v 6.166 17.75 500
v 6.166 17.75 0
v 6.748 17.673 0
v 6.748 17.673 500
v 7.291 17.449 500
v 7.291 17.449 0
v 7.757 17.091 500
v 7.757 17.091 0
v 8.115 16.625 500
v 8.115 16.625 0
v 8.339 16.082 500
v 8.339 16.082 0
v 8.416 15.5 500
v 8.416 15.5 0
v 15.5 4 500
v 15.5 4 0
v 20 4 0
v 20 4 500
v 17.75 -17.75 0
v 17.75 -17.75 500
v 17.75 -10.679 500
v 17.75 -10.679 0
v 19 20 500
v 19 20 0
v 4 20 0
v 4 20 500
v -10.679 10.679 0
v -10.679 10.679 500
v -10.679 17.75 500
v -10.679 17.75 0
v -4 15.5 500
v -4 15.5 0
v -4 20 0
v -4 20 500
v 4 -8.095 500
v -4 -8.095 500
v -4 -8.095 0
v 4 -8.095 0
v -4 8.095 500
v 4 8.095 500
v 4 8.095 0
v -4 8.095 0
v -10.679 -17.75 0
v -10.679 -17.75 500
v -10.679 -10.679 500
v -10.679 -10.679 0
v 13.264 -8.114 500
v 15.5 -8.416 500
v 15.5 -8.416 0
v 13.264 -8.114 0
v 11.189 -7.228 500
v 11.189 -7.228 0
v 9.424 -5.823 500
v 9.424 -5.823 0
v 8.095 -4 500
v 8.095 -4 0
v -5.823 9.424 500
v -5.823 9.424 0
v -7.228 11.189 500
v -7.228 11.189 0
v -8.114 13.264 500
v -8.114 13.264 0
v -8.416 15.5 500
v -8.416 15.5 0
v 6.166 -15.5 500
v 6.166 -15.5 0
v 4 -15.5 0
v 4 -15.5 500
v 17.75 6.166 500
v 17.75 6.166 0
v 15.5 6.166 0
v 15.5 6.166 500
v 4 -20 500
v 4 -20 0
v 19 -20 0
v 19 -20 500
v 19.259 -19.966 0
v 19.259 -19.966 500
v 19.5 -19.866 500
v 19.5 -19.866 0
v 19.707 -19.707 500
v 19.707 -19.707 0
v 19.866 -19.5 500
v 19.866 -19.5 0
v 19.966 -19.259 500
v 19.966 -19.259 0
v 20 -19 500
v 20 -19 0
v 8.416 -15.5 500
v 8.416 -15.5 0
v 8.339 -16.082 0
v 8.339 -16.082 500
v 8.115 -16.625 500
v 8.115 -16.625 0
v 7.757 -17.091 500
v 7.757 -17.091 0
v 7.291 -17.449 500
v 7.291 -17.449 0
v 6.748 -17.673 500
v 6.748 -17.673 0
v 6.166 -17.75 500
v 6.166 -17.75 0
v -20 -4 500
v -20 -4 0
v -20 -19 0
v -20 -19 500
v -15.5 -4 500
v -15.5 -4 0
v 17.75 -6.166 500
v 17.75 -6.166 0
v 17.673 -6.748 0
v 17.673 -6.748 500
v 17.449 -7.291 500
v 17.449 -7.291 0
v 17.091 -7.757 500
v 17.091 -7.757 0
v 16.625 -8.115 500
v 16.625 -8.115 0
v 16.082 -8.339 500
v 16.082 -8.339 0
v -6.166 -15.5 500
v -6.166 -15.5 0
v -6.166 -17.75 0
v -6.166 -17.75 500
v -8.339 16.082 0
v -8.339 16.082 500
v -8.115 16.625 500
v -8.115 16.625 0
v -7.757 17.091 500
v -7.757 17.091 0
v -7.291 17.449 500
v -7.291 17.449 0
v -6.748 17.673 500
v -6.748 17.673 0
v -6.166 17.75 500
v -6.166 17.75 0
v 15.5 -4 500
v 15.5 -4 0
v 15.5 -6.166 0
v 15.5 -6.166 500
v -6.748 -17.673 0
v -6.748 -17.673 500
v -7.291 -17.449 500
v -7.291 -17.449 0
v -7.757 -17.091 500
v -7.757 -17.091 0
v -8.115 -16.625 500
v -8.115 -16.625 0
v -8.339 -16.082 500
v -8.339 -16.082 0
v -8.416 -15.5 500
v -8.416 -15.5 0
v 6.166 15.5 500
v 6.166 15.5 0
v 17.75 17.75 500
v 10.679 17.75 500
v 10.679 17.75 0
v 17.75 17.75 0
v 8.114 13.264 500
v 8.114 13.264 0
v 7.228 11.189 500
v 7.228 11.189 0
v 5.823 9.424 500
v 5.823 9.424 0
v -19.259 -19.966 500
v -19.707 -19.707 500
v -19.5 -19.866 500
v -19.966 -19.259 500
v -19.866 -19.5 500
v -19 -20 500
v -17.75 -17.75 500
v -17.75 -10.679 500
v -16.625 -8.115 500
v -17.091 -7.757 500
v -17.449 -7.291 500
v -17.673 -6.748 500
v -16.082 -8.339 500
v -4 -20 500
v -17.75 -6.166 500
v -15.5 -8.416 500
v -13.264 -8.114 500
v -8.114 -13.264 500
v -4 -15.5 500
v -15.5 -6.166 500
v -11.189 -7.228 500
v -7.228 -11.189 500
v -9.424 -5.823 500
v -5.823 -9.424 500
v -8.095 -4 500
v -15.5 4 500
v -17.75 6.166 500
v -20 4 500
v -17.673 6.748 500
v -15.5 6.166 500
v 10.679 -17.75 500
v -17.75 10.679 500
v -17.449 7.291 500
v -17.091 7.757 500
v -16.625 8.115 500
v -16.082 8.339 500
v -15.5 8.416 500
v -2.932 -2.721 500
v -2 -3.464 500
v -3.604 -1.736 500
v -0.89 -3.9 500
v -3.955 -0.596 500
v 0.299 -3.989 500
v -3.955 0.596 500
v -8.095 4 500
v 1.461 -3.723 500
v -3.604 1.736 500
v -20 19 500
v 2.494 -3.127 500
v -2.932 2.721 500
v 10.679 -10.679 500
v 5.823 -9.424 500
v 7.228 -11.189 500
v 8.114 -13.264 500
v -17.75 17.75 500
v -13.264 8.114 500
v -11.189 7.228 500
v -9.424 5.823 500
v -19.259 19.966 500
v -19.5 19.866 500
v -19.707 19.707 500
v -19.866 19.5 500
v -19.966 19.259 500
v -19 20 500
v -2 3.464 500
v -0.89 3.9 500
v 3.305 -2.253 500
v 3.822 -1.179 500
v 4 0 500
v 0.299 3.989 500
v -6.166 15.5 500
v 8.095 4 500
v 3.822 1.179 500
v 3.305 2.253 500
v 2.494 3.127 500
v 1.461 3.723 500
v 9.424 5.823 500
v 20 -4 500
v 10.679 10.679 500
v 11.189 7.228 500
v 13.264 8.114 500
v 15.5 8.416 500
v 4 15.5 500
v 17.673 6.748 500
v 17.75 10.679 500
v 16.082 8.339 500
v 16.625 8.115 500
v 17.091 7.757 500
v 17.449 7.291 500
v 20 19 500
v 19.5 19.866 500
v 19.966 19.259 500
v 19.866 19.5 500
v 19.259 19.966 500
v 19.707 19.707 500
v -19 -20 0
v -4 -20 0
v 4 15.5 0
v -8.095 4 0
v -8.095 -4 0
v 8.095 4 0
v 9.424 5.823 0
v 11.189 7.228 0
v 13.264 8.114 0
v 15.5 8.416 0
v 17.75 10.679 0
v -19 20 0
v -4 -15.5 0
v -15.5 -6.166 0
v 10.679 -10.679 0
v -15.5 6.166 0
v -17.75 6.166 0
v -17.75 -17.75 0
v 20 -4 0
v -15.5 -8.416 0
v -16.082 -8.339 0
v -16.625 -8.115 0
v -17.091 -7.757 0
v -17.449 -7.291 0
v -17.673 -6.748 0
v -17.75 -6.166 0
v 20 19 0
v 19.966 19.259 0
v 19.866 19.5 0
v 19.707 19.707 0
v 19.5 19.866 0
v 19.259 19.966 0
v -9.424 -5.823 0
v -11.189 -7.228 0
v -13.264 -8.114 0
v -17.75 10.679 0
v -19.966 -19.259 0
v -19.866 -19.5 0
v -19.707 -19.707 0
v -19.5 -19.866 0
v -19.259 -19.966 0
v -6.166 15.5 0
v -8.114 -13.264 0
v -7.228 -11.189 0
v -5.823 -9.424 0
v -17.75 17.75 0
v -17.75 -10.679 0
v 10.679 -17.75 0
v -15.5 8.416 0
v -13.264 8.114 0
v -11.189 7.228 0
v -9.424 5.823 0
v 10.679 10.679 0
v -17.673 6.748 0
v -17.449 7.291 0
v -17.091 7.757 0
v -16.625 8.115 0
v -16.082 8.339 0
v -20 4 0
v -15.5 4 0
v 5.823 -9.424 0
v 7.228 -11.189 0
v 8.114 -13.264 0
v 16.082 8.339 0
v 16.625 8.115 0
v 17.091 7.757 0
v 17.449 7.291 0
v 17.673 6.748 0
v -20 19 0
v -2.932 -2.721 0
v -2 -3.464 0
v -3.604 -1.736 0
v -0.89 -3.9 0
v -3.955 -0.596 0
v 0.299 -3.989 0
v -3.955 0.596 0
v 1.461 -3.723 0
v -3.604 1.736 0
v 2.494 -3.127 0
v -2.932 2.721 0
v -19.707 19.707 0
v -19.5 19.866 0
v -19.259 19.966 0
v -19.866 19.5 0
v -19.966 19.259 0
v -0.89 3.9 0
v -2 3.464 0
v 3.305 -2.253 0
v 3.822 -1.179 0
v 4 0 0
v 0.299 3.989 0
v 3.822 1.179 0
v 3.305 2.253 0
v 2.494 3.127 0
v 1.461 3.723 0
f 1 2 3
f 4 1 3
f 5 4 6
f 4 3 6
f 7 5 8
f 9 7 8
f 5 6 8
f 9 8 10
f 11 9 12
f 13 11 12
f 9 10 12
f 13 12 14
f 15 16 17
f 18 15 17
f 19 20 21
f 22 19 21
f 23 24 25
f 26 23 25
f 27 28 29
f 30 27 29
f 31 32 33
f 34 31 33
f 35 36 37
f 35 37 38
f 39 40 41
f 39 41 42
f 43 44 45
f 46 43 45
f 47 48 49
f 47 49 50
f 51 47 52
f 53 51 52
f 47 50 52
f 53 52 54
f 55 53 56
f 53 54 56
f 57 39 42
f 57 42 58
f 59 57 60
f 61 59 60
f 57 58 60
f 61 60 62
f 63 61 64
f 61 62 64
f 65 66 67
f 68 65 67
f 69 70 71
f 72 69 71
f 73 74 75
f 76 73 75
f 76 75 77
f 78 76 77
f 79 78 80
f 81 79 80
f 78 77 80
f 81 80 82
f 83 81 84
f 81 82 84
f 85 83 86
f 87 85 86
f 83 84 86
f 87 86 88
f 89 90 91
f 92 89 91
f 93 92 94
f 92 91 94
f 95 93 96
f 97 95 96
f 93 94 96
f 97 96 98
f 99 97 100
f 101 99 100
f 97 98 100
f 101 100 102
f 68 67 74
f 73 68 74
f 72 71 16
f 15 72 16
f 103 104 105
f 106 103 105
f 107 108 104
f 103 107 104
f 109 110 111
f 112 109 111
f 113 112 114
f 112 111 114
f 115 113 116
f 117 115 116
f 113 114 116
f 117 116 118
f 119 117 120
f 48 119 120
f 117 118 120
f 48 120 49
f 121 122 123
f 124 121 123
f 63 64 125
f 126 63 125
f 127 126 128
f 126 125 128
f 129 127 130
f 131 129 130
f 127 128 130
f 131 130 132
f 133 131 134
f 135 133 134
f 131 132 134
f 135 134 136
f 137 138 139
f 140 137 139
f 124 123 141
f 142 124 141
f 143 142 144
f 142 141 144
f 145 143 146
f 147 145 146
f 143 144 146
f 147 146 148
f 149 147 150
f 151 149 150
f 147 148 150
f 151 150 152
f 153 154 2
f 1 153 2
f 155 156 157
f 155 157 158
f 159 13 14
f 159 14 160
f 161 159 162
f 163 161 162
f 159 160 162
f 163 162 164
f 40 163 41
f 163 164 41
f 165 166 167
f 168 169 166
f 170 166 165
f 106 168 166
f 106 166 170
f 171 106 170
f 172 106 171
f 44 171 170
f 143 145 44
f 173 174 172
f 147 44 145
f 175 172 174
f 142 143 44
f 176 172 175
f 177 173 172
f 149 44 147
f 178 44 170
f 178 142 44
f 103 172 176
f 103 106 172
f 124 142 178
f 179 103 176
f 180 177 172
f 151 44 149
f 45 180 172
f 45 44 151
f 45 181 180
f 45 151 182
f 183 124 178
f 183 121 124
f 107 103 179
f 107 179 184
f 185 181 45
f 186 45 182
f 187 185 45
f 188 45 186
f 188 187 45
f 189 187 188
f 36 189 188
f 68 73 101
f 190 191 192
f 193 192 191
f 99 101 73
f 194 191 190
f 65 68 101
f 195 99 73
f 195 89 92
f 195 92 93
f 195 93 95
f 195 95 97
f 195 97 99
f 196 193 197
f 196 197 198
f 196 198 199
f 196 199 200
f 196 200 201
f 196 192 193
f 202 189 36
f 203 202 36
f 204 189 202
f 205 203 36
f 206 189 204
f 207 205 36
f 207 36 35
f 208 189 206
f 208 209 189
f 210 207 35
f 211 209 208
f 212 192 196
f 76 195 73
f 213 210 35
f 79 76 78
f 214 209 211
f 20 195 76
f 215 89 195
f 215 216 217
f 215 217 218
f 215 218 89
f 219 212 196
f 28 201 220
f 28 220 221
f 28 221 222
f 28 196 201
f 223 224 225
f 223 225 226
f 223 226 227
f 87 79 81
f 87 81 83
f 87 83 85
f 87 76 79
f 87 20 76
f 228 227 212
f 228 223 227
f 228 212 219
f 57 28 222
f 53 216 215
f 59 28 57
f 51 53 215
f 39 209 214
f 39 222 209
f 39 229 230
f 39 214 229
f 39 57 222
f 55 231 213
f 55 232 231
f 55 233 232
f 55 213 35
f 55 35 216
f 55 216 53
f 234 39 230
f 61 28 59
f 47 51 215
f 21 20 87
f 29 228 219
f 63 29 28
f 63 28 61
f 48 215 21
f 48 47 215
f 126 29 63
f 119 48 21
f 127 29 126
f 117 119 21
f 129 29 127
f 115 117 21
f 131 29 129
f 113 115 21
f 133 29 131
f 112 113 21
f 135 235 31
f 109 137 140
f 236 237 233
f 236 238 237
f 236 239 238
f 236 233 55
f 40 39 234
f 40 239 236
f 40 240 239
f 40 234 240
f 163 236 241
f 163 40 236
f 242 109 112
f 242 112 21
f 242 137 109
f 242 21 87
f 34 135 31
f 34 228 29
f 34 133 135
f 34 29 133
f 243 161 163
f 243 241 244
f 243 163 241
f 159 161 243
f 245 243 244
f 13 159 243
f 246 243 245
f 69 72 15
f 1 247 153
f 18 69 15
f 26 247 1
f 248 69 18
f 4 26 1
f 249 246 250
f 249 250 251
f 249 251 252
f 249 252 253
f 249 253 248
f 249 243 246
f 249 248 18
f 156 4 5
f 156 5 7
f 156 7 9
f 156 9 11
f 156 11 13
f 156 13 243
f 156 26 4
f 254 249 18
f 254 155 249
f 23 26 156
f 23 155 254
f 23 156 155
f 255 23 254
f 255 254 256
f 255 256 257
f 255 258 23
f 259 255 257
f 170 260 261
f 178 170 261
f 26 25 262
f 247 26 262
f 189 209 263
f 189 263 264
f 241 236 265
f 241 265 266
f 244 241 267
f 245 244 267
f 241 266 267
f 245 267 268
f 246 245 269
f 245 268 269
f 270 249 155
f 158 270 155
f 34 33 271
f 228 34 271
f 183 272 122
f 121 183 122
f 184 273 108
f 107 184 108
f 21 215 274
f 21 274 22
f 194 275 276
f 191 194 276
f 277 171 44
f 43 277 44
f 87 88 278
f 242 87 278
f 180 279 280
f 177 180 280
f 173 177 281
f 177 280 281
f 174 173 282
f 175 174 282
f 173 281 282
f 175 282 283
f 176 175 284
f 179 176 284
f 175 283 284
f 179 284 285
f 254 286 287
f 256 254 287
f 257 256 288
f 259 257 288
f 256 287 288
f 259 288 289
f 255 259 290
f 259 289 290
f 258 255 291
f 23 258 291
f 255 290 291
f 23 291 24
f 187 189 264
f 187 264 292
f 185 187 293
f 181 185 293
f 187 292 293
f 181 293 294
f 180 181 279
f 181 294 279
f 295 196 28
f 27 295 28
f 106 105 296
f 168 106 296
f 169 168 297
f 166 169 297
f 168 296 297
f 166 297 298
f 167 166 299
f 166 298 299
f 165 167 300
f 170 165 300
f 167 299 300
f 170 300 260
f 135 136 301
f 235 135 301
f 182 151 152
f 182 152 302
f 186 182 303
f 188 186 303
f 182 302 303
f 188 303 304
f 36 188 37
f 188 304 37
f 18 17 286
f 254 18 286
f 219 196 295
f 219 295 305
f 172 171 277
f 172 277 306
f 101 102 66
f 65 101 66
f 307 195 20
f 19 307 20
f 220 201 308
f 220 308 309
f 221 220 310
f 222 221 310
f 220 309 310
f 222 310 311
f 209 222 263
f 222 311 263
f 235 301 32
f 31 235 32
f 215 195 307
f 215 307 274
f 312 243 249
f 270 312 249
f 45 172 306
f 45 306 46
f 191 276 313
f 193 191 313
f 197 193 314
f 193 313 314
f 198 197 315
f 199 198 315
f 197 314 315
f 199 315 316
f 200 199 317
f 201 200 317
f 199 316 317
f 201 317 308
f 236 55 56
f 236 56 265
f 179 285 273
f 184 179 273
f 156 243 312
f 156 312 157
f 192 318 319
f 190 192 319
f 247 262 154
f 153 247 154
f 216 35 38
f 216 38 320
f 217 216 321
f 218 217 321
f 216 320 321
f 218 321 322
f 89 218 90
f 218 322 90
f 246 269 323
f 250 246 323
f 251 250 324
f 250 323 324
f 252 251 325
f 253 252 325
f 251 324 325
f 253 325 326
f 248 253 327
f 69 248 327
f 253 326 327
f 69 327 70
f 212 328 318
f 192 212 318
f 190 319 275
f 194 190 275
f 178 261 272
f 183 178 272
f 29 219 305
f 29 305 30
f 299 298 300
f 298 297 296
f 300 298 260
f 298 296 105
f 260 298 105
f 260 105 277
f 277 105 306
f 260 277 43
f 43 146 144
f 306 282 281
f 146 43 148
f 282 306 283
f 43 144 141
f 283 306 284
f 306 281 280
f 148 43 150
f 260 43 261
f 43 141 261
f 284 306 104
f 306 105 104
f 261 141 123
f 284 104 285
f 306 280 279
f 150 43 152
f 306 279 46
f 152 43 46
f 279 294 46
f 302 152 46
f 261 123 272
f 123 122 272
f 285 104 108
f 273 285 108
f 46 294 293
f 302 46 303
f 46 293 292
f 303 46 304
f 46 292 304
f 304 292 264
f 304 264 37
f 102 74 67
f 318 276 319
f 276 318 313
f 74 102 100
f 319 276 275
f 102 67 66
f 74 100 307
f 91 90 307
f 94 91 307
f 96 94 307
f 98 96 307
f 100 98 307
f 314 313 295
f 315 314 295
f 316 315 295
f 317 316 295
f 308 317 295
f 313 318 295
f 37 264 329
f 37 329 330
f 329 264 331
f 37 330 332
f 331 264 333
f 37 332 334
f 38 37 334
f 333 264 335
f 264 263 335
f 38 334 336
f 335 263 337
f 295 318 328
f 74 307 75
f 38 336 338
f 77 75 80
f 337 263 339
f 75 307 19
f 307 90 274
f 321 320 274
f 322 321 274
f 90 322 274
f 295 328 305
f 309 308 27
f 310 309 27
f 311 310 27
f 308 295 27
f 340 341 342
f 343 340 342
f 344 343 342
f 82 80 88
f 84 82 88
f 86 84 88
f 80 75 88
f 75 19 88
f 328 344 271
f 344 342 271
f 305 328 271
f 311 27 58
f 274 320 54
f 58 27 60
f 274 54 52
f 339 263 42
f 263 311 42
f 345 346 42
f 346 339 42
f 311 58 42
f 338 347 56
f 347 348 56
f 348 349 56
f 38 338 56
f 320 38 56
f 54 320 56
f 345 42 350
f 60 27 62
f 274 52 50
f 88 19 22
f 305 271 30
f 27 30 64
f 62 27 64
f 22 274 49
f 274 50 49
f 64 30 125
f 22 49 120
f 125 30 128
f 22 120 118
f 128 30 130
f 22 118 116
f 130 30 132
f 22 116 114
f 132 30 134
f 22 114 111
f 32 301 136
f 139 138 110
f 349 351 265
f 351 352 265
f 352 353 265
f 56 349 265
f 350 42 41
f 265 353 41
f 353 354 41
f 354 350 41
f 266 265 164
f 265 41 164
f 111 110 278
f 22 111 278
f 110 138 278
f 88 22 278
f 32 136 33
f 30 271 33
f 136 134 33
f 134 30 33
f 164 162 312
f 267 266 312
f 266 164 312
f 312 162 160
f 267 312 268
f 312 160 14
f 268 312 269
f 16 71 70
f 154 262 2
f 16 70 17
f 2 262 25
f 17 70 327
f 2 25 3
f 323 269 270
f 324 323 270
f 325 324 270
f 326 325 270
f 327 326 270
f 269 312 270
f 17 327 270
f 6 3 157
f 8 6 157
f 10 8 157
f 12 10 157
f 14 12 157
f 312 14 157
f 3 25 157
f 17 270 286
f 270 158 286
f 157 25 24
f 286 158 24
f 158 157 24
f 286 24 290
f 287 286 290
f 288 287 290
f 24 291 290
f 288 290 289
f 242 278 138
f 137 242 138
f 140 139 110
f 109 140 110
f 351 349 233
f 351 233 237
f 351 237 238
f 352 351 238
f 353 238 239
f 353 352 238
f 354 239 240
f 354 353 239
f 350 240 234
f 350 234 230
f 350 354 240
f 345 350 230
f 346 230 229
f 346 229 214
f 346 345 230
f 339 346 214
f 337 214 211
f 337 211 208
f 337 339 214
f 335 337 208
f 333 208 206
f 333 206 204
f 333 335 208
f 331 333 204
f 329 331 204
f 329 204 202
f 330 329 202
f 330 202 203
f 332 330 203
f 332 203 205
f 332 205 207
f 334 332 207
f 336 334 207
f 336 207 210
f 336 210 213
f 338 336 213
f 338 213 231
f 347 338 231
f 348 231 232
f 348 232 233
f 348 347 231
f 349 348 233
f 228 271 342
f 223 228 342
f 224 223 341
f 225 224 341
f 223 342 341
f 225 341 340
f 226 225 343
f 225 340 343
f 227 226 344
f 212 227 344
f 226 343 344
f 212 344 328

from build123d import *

# Parameters (mm, degrees)
SZKIC1_R                    = 4
SZKIC1_W                    = 7.071067812
SZKIC1_H                    = 7.071067812
DODANIE_WYCI_GNI_CIE1_DEPTH = 500


with BuildPart() as part:
    # Szkic1 → Dodanie-wyciągnięcie1 (new body)
    with BuildSketch(Plane.XY):
        with BuildLine():
            Line((4, 20), (4, 15.5))
            Line((4, 15.5), (6.166140933, 15.5))
            Line((6.166140933, 15.5), (6.166140933, 17.75))
            ThreePointArc((6.166140933, 17.75), (7.757131191, 17.090990258), (8.416140933, 15.5))
            ThreePointArc((8.416140933, 15.5), (7.228277524, 11.189149476), (4, 8.095175343))
            Line((4, 8.095175343), (-4, 8.095175343))
            ThreePointArc((-4, 8.095175343), (-7.228277524, 11.189149476), (-8.416140933, 15.5))
            ThreePointArc((-8.416140933, 15.5), (-7.757131191, 17.090990258), (-6.166140933, 17.75))
            Line((-6.166140933, 17.75), (-6.166140933, 15.5))
            Line((-6.166140933, 15.5), (-4, 15.5))
            Line((-4, 15.5), (-4, 20))
            Line((-4, 20), (-19, 20))
            ThreePointArc((-19, 20), (-19.707106781, 19.707106781), (-20, 19))
            Line((-20, 19), (-20, 4))
            Line((-20, 4), (-15.5, 4))
            Line((-15.5, 4), (-15.5, 6.166140933))
            Line((-15.5, 6.166140933), (-17.75, 6.166140933))
            ThreePointArc((-17.75, 6.166140933), (-17.090990258, 7.757131191), (-15.5, 8.416140933))
            ThreePointArc((-15.5, 8.416140933), (-11.189149476, 7.228277524), (-8.095175343, 4))
            Line((-8.095175343, 4), (-8.095175343, -4))
            ThreePointArc((-8.095175343, -4), (-11.189149476, -7.228277524), (-15.5, -8.416140933))
            ThreePointArc((-15.5, -8.416140933), (-17.090990258, -7.757131191), (-17.75, -6.166140933))
            Line((-17.75, -6.166140933), (-15.5, -6.166140933))
            Line((-15.5, -6.166140933), (-15.5, -4))
            Line((-15.5, -4), (-20, -4))
            Line((-20, -4), (-20, -19))
            ThreePointArc((-20, -19), (-19.707106781, -19.707106781), (-19, -20))
            Line((-19, -20), (-4, -20))
            Line((-4, -20), (-4, -15.5))
            Line((-4, -15.5), (-6.166140933, -15.5))
            Line((-6.166140933, -15.5), (-6.166140933, -17.75))
            ThreePointArc((-6.166140933, -17.75), (-7.757131191, -17.090990258), (-8.416140933, -15.5))
            ThreePointArc((-8.416140933, -15.5), (-7.228277524, -11.189149476), (-4, -8.095175343))
            Line((-4, -8.095175343), (4, -8.095175343))
            ThreePointArc((4, -8.095175343), (7.228277524, -11.189149476), (8.416140933, -15.5))
            ThreePointArc((8.416140933, -15.5), (7.757131191, -17.090990258), (6.166140933, -17.75))
            Line((6.166140933, -17.75), (6.166140933, -15.5))
            Line((6.166140933, -15.5), (4, -15.5))
            Line((4, -15.5), (4, -20))
            Line((4, -20), (19, -20))
            ThreePointArc((19, -20), (19.707106781, -19.707106781), (20, -19))
            Line((20, -19), (20, -4))
            Line((20, -4), (15.5, -4))
            Line((15.5, -4), (15.5, -6.166140933))
            Line((15.5, -6.166140933), (17.75, -6.166140933))
            ThreePointArc((17.75, -6.166140933), (17.090990258, -7.757131191), (15.5, -8.416140933))
            ThreePointArc((15.5, -8.416140933), (11.189149476, -7.228277524), (8.095175343, -4))
            Line((8.095175343, -4), (8.095175343, 4))
            ThreePointArc((8.095175343, 4), (11.189149476, 7.228277524), (15.5, 8.416140933))
            ThreePointArc((15.5, 8.416140933), (17.090990258, 7.757131191), (17.75, 6.166140933))
            Line((17.75, 6.166140933), (15.5, 6.166140933))
            Line((15.5, 6.166140933), (15.5, 4))
            Line((15.5, 4), (20, 4))
            Line((20, 4), (20, 19))
            ThreePointArc((20, 19), (19.707106781, 19.707106781), (19, 20))
            Line((19, 20), (4, 20))
        make_face()
        Circle(SZKIC1_R, mode=Mode.SUBTRACT)
        with Locations((-14.214466094, 14.214466094)):
            Rectangle(SZKIC1_W, SZKIC1_H, mode=Mode.SUBTRACT)
        with Locations((14.214466094, 14.214466094)):
            Rectangle(SZKIC1_W, SZKIC1_H, mode=Mode.SUBTRACT)
        with Locations((14.214466094, -14.214466094)):
            Rectangle(SZKIC1_W, SZKIC1_H, mode=Mode.SUBTRACT)
        with Locations((-14.214466094, -14.214466094)):
            Rectangle(SZKIC1_W, SZKIC1_H, mode=Mode.SUBTRACT)
    extrude(amount=DODANIE_WYCI_GNI_CIE1_DEPTH)


solid = part.part
